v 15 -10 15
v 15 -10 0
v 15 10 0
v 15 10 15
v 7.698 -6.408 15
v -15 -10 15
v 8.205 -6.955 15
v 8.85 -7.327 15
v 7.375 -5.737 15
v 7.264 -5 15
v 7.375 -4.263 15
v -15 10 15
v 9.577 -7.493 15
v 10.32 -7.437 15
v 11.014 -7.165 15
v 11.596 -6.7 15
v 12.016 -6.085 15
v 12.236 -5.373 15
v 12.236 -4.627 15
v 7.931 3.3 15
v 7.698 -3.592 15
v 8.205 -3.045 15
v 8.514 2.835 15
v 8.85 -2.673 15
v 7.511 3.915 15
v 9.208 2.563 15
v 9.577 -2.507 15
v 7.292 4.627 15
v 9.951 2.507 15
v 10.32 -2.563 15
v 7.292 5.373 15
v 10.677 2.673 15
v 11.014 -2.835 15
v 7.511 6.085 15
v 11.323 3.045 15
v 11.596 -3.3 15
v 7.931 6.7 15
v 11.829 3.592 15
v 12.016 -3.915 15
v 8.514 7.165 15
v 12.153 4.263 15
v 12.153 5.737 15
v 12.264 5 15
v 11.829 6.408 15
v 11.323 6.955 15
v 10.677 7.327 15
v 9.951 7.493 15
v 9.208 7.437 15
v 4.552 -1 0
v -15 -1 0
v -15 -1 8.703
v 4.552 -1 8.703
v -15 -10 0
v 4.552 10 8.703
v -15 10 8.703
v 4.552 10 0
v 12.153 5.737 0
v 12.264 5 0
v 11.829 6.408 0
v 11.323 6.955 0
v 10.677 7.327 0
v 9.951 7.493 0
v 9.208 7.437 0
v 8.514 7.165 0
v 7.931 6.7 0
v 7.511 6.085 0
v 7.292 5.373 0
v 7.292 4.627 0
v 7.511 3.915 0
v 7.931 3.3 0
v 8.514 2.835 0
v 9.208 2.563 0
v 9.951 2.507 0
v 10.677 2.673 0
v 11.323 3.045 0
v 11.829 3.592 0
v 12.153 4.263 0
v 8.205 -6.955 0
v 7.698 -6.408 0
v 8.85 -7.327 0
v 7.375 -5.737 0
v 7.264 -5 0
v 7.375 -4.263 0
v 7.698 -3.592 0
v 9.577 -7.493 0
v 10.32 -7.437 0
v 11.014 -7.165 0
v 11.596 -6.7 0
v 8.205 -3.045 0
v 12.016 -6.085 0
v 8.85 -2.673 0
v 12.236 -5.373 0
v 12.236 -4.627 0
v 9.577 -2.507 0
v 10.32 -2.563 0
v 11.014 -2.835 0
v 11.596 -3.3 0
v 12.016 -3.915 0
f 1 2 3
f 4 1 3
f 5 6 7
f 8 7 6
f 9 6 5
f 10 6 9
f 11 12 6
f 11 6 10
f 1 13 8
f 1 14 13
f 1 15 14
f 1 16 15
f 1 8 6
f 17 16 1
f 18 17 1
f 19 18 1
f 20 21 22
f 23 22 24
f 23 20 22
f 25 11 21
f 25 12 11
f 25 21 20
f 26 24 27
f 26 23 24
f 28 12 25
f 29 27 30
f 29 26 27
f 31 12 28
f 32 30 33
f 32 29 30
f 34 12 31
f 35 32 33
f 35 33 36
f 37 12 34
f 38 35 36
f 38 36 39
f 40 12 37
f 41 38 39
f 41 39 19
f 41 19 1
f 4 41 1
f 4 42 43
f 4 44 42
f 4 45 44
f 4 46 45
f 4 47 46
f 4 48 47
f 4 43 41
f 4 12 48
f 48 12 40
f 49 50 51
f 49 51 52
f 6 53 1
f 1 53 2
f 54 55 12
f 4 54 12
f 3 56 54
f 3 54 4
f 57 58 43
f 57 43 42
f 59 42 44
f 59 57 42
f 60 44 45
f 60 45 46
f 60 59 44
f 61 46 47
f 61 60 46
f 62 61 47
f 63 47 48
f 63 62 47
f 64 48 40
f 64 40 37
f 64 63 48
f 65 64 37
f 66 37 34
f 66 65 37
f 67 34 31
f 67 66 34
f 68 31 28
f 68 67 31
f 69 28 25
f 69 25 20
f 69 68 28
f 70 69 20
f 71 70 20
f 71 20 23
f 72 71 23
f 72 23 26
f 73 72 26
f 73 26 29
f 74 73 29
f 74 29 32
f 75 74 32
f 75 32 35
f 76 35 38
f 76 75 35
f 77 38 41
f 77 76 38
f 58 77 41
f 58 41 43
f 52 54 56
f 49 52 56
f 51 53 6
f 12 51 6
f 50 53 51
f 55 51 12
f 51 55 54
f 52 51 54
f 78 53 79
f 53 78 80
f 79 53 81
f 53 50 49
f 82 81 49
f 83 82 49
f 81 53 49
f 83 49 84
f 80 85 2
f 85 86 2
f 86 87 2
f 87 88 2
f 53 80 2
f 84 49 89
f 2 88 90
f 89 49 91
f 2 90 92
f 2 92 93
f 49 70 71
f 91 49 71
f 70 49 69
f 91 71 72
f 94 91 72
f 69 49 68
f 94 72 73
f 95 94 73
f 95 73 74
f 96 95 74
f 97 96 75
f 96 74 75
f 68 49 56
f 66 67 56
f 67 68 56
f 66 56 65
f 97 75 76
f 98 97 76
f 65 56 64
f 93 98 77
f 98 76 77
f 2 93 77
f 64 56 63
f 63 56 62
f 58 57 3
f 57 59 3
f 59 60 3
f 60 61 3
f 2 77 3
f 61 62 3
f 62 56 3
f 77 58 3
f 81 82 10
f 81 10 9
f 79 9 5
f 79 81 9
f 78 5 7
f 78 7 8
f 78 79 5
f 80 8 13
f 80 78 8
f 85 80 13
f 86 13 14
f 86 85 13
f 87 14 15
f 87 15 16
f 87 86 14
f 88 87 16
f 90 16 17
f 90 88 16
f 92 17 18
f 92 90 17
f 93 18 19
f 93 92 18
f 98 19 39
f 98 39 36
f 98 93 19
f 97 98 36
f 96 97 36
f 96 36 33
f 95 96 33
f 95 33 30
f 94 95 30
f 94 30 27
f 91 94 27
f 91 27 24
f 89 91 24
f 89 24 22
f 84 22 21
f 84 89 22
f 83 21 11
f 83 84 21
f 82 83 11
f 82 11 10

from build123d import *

# Parameters (mm, degrees)
ESQUISSE1_W             = 30
ESQUISSE1_H             = 20
ESQUISSE1_R             = 2.5
BOSS_EXTRU_1_DEPTH      = 15
ESQUISSE2_W             = 19.552131663
ESQUISSE2_H             = 8.703273887
ENL_V_MAT_EXTRU_1_DEPTH = 11


with BuildPart() as part:
    # Esquisse1 → Boss.-Extru.1 (new body)
    with BuildSketch(Plane.XY):
        Rectangle(ESQUISSE1_W, ESQUISSE1_H)
        with Locations((9.763813692, 5)):
            Circle(ESQUISSE1_R, mode=Mode.SUBTRACT)
        with Locations(Location((9.763813692, -5, 0), (0, 0, 180))):
            Circle(ESQUISSE1_R, mode=Mode.SUBTRACT)
    extrude(amount=BOSS_EXTRU_1_DEPTH)

    # Esquisse2 → Enlèv. mat.-Extru.1 (cut)
    with BuildSketch(Plane(origin=(0, 10, 0), x_dir=(1, 0, 0), z_dir=(0, 1, 0))):
        with Locations((-5.223934169, -4.351636943)):
            Rectangle(ESQUISSE2_W, ESQUISSE2_H)
    extrude(amount=-ENL_V_MAT_EXTRU_1_DEPTH, mode=Mode.SUBTRACT)


solid = part.part
